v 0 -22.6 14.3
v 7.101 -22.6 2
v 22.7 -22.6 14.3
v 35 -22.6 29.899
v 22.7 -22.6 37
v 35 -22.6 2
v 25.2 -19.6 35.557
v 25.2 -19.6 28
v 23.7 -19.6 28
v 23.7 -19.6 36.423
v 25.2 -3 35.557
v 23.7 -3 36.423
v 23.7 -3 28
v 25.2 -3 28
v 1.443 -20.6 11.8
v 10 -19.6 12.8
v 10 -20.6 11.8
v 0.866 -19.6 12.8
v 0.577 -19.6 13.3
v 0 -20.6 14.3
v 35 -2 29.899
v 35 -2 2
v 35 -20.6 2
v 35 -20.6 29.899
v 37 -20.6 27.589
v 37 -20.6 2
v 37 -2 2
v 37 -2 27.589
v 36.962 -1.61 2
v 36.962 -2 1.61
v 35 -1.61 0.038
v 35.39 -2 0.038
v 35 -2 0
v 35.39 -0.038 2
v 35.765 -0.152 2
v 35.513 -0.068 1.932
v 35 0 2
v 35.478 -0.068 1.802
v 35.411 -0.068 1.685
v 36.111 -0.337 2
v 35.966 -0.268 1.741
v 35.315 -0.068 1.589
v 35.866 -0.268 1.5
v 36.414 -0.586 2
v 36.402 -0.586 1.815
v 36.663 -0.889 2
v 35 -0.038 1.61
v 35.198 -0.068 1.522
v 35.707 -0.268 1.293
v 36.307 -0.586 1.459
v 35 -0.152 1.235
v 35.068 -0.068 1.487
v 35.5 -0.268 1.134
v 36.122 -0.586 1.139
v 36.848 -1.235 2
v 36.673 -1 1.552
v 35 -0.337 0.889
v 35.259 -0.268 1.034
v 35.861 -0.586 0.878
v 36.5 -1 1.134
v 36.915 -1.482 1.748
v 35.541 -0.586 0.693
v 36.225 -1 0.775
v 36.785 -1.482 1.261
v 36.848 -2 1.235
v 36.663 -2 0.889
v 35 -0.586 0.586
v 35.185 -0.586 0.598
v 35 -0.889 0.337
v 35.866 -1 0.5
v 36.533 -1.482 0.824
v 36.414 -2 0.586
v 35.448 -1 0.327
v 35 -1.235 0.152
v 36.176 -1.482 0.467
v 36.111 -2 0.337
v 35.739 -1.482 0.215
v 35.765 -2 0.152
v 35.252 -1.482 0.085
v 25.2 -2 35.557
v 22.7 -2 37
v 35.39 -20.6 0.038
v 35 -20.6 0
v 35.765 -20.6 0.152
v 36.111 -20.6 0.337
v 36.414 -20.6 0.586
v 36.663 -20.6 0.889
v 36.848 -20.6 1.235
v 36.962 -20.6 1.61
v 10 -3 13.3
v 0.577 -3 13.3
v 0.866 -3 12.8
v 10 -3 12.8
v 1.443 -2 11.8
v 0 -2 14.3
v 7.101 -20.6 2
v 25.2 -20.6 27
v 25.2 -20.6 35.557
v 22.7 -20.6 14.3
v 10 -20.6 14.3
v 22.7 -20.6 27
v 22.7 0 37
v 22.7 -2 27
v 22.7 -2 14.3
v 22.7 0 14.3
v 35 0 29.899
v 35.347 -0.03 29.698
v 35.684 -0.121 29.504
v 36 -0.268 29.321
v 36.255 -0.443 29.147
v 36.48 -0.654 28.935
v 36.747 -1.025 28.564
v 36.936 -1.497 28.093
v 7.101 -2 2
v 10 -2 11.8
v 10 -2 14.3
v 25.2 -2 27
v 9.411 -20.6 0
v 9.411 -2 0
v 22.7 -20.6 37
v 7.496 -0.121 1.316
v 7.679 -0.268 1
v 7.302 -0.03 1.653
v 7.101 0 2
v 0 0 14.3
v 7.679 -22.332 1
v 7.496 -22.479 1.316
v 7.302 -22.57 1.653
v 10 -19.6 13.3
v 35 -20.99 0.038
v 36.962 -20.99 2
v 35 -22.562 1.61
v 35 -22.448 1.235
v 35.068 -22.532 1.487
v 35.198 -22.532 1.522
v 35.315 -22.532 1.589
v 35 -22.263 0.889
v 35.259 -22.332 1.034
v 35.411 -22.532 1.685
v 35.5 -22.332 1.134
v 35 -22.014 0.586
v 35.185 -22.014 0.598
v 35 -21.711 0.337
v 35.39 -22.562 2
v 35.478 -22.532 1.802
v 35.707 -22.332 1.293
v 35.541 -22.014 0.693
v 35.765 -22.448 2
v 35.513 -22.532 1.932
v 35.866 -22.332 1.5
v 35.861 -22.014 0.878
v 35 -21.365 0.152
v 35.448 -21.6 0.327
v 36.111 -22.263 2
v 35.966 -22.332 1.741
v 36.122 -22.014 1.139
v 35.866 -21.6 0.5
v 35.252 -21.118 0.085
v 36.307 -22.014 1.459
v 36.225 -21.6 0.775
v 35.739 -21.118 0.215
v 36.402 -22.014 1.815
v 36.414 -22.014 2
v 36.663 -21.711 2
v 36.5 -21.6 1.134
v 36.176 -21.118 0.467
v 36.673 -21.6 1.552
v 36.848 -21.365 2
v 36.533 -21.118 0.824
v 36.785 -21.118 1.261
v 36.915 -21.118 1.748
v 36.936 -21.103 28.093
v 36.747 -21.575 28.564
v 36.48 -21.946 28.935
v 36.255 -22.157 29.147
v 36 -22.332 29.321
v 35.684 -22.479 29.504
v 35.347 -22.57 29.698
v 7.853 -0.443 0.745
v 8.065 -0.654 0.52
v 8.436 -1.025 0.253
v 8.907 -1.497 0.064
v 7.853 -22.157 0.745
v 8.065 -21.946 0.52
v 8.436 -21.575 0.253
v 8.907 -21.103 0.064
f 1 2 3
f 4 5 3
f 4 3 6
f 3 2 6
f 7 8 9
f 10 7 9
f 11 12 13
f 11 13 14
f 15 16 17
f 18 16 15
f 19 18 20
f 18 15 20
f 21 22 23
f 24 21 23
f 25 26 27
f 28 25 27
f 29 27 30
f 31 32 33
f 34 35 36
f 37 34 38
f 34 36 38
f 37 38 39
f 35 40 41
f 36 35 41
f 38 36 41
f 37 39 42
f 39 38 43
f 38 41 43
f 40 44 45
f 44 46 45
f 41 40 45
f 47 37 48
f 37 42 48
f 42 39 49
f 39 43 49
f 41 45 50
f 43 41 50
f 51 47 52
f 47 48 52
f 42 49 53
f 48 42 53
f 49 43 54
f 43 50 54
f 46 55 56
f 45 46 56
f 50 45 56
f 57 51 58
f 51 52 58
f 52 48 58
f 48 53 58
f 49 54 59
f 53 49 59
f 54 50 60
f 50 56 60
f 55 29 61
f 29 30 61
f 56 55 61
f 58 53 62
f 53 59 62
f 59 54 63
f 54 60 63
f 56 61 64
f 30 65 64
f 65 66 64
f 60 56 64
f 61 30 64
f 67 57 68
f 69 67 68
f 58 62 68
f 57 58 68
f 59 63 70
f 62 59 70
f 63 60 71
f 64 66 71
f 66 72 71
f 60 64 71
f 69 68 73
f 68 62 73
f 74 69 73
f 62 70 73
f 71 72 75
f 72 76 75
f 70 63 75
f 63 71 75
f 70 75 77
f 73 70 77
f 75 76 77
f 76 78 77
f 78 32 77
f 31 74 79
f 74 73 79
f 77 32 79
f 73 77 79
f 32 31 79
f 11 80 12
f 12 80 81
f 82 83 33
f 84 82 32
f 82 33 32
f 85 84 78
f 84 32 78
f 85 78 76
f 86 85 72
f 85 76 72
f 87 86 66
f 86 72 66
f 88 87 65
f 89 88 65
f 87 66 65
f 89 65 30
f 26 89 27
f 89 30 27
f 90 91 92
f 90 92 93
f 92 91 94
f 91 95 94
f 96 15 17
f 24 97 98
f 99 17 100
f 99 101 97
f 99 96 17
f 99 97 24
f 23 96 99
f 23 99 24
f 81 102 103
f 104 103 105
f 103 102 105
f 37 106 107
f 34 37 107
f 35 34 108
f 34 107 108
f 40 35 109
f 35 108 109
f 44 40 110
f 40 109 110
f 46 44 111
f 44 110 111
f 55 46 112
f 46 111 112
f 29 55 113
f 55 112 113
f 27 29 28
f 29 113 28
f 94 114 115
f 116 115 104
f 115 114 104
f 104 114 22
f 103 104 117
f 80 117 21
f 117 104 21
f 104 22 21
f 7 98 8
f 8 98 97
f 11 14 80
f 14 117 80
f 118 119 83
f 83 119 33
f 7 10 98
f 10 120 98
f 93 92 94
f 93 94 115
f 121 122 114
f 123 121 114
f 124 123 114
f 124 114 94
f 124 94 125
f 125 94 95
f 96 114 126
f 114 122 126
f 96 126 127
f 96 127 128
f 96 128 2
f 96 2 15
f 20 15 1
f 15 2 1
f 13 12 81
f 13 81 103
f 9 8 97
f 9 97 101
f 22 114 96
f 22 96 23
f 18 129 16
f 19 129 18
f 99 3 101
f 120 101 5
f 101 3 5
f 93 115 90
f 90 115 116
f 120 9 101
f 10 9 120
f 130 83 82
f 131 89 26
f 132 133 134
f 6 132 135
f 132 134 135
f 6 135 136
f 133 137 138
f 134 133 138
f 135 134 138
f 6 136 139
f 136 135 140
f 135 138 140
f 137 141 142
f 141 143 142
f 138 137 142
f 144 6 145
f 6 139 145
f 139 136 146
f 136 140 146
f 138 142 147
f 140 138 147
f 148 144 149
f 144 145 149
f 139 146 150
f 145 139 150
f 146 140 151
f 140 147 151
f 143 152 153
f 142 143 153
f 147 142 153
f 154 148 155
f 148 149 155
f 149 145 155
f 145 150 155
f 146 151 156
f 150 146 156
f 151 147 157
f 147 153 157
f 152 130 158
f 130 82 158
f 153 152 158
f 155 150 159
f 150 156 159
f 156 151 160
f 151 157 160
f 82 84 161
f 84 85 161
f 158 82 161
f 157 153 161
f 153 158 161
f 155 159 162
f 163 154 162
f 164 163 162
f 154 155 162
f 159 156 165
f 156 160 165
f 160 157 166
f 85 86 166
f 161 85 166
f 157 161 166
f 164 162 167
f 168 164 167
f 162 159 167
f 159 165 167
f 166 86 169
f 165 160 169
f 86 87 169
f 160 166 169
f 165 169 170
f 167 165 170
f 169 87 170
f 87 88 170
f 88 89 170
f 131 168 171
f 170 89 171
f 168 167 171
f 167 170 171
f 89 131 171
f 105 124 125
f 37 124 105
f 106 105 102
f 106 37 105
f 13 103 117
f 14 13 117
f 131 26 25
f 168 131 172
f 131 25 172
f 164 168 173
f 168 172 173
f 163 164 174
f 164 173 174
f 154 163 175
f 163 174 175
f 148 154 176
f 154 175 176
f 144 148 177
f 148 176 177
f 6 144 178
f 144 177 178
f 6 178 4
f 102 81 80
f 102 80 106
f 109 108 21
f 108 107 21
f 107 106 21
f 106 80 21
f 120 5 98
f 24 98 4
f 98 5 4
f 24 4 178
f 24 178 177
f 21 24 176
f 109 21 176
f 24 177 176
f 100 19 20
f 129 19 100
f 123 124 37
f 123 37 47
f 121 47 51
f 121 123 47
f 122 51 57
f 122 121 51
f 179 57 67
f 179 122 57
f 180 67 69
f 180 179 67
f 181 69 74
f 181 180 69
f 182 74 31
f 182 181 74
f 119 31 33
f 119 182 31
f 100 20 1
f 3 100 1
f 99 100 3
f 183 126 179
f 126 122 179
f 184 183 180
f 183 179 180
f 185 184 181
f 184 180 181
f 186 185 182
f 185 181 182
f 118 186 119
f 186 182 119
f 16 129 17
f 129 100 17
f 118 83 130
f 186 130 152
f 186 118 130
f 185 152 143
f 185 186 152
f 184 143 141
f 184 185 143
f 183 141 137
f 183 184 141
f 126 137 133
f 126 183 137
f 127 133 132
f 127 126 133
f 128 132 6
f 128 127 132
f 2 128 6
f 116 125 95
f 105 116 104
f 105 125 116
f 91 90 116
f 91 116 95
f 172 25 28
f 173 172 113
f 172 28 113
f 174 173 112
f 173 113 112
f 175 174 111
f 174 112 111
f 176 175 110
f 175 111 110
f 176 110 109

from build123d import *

# Parameters (mm, degrees)
F4_W      = 35
F4_H      = 18.6
F5_DEPTH  = 2
F4_W_2    = 2
F4_H_2    = 2
F6_DEPTH  = 37
F7_DEPTH  = 14.3
F8_W      = 2
F8_H      = 22.7
F9_DEPTH  = 12.3
F11_DEPTH = 22.6
F12_R     = 2
F14_DEPTH = 1
F15_SIZE  = 0.99999
F17_DEPTH = 1
F18_SIZE  = 0.99999


# Not quite as in the source:
# - a fillet or chamfer is up to 0.001 mm smaller than in the source, because OpenCascade refuses the exact size


with BuildPart() as f5:
    # F4 (on Top) → F5 (new body)
    with BuildSketch(Plane.XY):
        with Locations((17.5, -11.3)):
            Rectangle(F4_W, F4_H)
    extrude(amount=F5_DEPTH)

    # F4 (on Top) → F6 (join)
    with BuildSketch(Plane.XY):
        with Locations((36, -11.3)):
            Rectangle(F4_W_2, F4_H)
        with Locations((36, -21.6)):
            Rectangle(F4_W_2, F4_H_2)
        with Locations((36, -1)):
            Rectangle(F4_W_2, F4_H_2)
    extrude(amount=F6_DEPTH)

    # F4 (on Top) → F7 (join)
    with BuildSketch(Plane.XY):
        with Locations((17.5, -1)):
            Rectangle(F4_W, F4_H_2)
        with Locations((17.5, -21.6)):
            Rectangle(F4_W, F4_H_2)
    extrude(amount=F7_DEPTH)

    # F8 (on face) → F9 (join)
    with BuildSketch(Plane(origin=(35, 0, 0), x_dir=(0, -1, 0), z_dir=(-1, 0, 0))):
        with Locations((1, 25.65)):
            Rectangle(F8_W, F8_H)
        with Locations((21.6, 25.65)):
            Rectangle(F8_W, F8_H)
    extrude(amount=F9_DEPTH)

    # F10 (on face) → F11 (cut)
    with BuildSketch(Plane.XZ.offset(22.6)):
        Polygon((8.2561088494, 0), (0, 14.3), (0, 0), align=None)
        Polygon((37, 37), (22.7, 37), (37, 28.7438911506), align=None)
    extrude(amount=-F11_DEPTH, mode=Mode.SUBTRACT)

    # F12
    f12_edges = [f5.edges().sort_by_distance(p)[0] for p in [
        (37, -11.3, 0),
        (22.628054, -22.6, 0),
        (37, -22.6, 14.371946),
        (37, 0, 14.371946),
        (22.628054, 0, 0),
        (8.256109, -11.3, 0),
        (37, -11.3, 28.743891),
    ]]
    fillet(f12_edges, radius=F12_R)

    # F13 (on face) → F14 (join)
    with BuildSketch(Plane.XZ.offset(2)):
        Polygon((25.2, 35.556624327), (22.7, 37), (22.7, 27), (25.2, 27), align=None)
        Polygon((10, 11.8), (10, 14.3), (0, 14.3), (1.443375673, 11.8), align=None)
    extrude(amount=F14_DEPTH)

    # F15 (size 1 in the source; OpenCascade refuses exactly that, so slightly less here)
    f15_edges = [f5.edges().sort_by_distance(p)[0] for p in [
        (23.95, -3, 27),
        (5.721688, -3, 11.8),
        (22.7, -3, 32),
        (5, -3, 14.3),
    ]]
    chamfer(f15_edges, length=F15_SIZE)

    # F16 (on face) → F17 (join)
    with BuildSketch(Plane(origin=(0, -20.6, 0), x_dir=(-1, 0, 0), z_dir=(0, 1, 0))):
        Polygon((-22.7, 27), (-22.7, 37), (-25.2, 35.556624327), (-25.2, 27), align=None)
        Polygon((0, 14.3), (-10, 14.3), (-10, 11.8), (-1.443375673, 11.8), align=None)
    extrude(amount=F17_DEPTH)

    # F18 (size 1 in the source; OpenCascade refuses exactly that, so slightly less here)
    f18_edges = [f5.edges().sort_by_distance(p)[0] for p in [
        (5.721688, -19.6, 11.8),
        (5, -19.6, 14.3),
        (22.7, -19.6, 32),
        (23.95, -19.6, 27),
    ]]
    chamfer(f18_edges, length=F18_SIZE)


solid = f5.part
